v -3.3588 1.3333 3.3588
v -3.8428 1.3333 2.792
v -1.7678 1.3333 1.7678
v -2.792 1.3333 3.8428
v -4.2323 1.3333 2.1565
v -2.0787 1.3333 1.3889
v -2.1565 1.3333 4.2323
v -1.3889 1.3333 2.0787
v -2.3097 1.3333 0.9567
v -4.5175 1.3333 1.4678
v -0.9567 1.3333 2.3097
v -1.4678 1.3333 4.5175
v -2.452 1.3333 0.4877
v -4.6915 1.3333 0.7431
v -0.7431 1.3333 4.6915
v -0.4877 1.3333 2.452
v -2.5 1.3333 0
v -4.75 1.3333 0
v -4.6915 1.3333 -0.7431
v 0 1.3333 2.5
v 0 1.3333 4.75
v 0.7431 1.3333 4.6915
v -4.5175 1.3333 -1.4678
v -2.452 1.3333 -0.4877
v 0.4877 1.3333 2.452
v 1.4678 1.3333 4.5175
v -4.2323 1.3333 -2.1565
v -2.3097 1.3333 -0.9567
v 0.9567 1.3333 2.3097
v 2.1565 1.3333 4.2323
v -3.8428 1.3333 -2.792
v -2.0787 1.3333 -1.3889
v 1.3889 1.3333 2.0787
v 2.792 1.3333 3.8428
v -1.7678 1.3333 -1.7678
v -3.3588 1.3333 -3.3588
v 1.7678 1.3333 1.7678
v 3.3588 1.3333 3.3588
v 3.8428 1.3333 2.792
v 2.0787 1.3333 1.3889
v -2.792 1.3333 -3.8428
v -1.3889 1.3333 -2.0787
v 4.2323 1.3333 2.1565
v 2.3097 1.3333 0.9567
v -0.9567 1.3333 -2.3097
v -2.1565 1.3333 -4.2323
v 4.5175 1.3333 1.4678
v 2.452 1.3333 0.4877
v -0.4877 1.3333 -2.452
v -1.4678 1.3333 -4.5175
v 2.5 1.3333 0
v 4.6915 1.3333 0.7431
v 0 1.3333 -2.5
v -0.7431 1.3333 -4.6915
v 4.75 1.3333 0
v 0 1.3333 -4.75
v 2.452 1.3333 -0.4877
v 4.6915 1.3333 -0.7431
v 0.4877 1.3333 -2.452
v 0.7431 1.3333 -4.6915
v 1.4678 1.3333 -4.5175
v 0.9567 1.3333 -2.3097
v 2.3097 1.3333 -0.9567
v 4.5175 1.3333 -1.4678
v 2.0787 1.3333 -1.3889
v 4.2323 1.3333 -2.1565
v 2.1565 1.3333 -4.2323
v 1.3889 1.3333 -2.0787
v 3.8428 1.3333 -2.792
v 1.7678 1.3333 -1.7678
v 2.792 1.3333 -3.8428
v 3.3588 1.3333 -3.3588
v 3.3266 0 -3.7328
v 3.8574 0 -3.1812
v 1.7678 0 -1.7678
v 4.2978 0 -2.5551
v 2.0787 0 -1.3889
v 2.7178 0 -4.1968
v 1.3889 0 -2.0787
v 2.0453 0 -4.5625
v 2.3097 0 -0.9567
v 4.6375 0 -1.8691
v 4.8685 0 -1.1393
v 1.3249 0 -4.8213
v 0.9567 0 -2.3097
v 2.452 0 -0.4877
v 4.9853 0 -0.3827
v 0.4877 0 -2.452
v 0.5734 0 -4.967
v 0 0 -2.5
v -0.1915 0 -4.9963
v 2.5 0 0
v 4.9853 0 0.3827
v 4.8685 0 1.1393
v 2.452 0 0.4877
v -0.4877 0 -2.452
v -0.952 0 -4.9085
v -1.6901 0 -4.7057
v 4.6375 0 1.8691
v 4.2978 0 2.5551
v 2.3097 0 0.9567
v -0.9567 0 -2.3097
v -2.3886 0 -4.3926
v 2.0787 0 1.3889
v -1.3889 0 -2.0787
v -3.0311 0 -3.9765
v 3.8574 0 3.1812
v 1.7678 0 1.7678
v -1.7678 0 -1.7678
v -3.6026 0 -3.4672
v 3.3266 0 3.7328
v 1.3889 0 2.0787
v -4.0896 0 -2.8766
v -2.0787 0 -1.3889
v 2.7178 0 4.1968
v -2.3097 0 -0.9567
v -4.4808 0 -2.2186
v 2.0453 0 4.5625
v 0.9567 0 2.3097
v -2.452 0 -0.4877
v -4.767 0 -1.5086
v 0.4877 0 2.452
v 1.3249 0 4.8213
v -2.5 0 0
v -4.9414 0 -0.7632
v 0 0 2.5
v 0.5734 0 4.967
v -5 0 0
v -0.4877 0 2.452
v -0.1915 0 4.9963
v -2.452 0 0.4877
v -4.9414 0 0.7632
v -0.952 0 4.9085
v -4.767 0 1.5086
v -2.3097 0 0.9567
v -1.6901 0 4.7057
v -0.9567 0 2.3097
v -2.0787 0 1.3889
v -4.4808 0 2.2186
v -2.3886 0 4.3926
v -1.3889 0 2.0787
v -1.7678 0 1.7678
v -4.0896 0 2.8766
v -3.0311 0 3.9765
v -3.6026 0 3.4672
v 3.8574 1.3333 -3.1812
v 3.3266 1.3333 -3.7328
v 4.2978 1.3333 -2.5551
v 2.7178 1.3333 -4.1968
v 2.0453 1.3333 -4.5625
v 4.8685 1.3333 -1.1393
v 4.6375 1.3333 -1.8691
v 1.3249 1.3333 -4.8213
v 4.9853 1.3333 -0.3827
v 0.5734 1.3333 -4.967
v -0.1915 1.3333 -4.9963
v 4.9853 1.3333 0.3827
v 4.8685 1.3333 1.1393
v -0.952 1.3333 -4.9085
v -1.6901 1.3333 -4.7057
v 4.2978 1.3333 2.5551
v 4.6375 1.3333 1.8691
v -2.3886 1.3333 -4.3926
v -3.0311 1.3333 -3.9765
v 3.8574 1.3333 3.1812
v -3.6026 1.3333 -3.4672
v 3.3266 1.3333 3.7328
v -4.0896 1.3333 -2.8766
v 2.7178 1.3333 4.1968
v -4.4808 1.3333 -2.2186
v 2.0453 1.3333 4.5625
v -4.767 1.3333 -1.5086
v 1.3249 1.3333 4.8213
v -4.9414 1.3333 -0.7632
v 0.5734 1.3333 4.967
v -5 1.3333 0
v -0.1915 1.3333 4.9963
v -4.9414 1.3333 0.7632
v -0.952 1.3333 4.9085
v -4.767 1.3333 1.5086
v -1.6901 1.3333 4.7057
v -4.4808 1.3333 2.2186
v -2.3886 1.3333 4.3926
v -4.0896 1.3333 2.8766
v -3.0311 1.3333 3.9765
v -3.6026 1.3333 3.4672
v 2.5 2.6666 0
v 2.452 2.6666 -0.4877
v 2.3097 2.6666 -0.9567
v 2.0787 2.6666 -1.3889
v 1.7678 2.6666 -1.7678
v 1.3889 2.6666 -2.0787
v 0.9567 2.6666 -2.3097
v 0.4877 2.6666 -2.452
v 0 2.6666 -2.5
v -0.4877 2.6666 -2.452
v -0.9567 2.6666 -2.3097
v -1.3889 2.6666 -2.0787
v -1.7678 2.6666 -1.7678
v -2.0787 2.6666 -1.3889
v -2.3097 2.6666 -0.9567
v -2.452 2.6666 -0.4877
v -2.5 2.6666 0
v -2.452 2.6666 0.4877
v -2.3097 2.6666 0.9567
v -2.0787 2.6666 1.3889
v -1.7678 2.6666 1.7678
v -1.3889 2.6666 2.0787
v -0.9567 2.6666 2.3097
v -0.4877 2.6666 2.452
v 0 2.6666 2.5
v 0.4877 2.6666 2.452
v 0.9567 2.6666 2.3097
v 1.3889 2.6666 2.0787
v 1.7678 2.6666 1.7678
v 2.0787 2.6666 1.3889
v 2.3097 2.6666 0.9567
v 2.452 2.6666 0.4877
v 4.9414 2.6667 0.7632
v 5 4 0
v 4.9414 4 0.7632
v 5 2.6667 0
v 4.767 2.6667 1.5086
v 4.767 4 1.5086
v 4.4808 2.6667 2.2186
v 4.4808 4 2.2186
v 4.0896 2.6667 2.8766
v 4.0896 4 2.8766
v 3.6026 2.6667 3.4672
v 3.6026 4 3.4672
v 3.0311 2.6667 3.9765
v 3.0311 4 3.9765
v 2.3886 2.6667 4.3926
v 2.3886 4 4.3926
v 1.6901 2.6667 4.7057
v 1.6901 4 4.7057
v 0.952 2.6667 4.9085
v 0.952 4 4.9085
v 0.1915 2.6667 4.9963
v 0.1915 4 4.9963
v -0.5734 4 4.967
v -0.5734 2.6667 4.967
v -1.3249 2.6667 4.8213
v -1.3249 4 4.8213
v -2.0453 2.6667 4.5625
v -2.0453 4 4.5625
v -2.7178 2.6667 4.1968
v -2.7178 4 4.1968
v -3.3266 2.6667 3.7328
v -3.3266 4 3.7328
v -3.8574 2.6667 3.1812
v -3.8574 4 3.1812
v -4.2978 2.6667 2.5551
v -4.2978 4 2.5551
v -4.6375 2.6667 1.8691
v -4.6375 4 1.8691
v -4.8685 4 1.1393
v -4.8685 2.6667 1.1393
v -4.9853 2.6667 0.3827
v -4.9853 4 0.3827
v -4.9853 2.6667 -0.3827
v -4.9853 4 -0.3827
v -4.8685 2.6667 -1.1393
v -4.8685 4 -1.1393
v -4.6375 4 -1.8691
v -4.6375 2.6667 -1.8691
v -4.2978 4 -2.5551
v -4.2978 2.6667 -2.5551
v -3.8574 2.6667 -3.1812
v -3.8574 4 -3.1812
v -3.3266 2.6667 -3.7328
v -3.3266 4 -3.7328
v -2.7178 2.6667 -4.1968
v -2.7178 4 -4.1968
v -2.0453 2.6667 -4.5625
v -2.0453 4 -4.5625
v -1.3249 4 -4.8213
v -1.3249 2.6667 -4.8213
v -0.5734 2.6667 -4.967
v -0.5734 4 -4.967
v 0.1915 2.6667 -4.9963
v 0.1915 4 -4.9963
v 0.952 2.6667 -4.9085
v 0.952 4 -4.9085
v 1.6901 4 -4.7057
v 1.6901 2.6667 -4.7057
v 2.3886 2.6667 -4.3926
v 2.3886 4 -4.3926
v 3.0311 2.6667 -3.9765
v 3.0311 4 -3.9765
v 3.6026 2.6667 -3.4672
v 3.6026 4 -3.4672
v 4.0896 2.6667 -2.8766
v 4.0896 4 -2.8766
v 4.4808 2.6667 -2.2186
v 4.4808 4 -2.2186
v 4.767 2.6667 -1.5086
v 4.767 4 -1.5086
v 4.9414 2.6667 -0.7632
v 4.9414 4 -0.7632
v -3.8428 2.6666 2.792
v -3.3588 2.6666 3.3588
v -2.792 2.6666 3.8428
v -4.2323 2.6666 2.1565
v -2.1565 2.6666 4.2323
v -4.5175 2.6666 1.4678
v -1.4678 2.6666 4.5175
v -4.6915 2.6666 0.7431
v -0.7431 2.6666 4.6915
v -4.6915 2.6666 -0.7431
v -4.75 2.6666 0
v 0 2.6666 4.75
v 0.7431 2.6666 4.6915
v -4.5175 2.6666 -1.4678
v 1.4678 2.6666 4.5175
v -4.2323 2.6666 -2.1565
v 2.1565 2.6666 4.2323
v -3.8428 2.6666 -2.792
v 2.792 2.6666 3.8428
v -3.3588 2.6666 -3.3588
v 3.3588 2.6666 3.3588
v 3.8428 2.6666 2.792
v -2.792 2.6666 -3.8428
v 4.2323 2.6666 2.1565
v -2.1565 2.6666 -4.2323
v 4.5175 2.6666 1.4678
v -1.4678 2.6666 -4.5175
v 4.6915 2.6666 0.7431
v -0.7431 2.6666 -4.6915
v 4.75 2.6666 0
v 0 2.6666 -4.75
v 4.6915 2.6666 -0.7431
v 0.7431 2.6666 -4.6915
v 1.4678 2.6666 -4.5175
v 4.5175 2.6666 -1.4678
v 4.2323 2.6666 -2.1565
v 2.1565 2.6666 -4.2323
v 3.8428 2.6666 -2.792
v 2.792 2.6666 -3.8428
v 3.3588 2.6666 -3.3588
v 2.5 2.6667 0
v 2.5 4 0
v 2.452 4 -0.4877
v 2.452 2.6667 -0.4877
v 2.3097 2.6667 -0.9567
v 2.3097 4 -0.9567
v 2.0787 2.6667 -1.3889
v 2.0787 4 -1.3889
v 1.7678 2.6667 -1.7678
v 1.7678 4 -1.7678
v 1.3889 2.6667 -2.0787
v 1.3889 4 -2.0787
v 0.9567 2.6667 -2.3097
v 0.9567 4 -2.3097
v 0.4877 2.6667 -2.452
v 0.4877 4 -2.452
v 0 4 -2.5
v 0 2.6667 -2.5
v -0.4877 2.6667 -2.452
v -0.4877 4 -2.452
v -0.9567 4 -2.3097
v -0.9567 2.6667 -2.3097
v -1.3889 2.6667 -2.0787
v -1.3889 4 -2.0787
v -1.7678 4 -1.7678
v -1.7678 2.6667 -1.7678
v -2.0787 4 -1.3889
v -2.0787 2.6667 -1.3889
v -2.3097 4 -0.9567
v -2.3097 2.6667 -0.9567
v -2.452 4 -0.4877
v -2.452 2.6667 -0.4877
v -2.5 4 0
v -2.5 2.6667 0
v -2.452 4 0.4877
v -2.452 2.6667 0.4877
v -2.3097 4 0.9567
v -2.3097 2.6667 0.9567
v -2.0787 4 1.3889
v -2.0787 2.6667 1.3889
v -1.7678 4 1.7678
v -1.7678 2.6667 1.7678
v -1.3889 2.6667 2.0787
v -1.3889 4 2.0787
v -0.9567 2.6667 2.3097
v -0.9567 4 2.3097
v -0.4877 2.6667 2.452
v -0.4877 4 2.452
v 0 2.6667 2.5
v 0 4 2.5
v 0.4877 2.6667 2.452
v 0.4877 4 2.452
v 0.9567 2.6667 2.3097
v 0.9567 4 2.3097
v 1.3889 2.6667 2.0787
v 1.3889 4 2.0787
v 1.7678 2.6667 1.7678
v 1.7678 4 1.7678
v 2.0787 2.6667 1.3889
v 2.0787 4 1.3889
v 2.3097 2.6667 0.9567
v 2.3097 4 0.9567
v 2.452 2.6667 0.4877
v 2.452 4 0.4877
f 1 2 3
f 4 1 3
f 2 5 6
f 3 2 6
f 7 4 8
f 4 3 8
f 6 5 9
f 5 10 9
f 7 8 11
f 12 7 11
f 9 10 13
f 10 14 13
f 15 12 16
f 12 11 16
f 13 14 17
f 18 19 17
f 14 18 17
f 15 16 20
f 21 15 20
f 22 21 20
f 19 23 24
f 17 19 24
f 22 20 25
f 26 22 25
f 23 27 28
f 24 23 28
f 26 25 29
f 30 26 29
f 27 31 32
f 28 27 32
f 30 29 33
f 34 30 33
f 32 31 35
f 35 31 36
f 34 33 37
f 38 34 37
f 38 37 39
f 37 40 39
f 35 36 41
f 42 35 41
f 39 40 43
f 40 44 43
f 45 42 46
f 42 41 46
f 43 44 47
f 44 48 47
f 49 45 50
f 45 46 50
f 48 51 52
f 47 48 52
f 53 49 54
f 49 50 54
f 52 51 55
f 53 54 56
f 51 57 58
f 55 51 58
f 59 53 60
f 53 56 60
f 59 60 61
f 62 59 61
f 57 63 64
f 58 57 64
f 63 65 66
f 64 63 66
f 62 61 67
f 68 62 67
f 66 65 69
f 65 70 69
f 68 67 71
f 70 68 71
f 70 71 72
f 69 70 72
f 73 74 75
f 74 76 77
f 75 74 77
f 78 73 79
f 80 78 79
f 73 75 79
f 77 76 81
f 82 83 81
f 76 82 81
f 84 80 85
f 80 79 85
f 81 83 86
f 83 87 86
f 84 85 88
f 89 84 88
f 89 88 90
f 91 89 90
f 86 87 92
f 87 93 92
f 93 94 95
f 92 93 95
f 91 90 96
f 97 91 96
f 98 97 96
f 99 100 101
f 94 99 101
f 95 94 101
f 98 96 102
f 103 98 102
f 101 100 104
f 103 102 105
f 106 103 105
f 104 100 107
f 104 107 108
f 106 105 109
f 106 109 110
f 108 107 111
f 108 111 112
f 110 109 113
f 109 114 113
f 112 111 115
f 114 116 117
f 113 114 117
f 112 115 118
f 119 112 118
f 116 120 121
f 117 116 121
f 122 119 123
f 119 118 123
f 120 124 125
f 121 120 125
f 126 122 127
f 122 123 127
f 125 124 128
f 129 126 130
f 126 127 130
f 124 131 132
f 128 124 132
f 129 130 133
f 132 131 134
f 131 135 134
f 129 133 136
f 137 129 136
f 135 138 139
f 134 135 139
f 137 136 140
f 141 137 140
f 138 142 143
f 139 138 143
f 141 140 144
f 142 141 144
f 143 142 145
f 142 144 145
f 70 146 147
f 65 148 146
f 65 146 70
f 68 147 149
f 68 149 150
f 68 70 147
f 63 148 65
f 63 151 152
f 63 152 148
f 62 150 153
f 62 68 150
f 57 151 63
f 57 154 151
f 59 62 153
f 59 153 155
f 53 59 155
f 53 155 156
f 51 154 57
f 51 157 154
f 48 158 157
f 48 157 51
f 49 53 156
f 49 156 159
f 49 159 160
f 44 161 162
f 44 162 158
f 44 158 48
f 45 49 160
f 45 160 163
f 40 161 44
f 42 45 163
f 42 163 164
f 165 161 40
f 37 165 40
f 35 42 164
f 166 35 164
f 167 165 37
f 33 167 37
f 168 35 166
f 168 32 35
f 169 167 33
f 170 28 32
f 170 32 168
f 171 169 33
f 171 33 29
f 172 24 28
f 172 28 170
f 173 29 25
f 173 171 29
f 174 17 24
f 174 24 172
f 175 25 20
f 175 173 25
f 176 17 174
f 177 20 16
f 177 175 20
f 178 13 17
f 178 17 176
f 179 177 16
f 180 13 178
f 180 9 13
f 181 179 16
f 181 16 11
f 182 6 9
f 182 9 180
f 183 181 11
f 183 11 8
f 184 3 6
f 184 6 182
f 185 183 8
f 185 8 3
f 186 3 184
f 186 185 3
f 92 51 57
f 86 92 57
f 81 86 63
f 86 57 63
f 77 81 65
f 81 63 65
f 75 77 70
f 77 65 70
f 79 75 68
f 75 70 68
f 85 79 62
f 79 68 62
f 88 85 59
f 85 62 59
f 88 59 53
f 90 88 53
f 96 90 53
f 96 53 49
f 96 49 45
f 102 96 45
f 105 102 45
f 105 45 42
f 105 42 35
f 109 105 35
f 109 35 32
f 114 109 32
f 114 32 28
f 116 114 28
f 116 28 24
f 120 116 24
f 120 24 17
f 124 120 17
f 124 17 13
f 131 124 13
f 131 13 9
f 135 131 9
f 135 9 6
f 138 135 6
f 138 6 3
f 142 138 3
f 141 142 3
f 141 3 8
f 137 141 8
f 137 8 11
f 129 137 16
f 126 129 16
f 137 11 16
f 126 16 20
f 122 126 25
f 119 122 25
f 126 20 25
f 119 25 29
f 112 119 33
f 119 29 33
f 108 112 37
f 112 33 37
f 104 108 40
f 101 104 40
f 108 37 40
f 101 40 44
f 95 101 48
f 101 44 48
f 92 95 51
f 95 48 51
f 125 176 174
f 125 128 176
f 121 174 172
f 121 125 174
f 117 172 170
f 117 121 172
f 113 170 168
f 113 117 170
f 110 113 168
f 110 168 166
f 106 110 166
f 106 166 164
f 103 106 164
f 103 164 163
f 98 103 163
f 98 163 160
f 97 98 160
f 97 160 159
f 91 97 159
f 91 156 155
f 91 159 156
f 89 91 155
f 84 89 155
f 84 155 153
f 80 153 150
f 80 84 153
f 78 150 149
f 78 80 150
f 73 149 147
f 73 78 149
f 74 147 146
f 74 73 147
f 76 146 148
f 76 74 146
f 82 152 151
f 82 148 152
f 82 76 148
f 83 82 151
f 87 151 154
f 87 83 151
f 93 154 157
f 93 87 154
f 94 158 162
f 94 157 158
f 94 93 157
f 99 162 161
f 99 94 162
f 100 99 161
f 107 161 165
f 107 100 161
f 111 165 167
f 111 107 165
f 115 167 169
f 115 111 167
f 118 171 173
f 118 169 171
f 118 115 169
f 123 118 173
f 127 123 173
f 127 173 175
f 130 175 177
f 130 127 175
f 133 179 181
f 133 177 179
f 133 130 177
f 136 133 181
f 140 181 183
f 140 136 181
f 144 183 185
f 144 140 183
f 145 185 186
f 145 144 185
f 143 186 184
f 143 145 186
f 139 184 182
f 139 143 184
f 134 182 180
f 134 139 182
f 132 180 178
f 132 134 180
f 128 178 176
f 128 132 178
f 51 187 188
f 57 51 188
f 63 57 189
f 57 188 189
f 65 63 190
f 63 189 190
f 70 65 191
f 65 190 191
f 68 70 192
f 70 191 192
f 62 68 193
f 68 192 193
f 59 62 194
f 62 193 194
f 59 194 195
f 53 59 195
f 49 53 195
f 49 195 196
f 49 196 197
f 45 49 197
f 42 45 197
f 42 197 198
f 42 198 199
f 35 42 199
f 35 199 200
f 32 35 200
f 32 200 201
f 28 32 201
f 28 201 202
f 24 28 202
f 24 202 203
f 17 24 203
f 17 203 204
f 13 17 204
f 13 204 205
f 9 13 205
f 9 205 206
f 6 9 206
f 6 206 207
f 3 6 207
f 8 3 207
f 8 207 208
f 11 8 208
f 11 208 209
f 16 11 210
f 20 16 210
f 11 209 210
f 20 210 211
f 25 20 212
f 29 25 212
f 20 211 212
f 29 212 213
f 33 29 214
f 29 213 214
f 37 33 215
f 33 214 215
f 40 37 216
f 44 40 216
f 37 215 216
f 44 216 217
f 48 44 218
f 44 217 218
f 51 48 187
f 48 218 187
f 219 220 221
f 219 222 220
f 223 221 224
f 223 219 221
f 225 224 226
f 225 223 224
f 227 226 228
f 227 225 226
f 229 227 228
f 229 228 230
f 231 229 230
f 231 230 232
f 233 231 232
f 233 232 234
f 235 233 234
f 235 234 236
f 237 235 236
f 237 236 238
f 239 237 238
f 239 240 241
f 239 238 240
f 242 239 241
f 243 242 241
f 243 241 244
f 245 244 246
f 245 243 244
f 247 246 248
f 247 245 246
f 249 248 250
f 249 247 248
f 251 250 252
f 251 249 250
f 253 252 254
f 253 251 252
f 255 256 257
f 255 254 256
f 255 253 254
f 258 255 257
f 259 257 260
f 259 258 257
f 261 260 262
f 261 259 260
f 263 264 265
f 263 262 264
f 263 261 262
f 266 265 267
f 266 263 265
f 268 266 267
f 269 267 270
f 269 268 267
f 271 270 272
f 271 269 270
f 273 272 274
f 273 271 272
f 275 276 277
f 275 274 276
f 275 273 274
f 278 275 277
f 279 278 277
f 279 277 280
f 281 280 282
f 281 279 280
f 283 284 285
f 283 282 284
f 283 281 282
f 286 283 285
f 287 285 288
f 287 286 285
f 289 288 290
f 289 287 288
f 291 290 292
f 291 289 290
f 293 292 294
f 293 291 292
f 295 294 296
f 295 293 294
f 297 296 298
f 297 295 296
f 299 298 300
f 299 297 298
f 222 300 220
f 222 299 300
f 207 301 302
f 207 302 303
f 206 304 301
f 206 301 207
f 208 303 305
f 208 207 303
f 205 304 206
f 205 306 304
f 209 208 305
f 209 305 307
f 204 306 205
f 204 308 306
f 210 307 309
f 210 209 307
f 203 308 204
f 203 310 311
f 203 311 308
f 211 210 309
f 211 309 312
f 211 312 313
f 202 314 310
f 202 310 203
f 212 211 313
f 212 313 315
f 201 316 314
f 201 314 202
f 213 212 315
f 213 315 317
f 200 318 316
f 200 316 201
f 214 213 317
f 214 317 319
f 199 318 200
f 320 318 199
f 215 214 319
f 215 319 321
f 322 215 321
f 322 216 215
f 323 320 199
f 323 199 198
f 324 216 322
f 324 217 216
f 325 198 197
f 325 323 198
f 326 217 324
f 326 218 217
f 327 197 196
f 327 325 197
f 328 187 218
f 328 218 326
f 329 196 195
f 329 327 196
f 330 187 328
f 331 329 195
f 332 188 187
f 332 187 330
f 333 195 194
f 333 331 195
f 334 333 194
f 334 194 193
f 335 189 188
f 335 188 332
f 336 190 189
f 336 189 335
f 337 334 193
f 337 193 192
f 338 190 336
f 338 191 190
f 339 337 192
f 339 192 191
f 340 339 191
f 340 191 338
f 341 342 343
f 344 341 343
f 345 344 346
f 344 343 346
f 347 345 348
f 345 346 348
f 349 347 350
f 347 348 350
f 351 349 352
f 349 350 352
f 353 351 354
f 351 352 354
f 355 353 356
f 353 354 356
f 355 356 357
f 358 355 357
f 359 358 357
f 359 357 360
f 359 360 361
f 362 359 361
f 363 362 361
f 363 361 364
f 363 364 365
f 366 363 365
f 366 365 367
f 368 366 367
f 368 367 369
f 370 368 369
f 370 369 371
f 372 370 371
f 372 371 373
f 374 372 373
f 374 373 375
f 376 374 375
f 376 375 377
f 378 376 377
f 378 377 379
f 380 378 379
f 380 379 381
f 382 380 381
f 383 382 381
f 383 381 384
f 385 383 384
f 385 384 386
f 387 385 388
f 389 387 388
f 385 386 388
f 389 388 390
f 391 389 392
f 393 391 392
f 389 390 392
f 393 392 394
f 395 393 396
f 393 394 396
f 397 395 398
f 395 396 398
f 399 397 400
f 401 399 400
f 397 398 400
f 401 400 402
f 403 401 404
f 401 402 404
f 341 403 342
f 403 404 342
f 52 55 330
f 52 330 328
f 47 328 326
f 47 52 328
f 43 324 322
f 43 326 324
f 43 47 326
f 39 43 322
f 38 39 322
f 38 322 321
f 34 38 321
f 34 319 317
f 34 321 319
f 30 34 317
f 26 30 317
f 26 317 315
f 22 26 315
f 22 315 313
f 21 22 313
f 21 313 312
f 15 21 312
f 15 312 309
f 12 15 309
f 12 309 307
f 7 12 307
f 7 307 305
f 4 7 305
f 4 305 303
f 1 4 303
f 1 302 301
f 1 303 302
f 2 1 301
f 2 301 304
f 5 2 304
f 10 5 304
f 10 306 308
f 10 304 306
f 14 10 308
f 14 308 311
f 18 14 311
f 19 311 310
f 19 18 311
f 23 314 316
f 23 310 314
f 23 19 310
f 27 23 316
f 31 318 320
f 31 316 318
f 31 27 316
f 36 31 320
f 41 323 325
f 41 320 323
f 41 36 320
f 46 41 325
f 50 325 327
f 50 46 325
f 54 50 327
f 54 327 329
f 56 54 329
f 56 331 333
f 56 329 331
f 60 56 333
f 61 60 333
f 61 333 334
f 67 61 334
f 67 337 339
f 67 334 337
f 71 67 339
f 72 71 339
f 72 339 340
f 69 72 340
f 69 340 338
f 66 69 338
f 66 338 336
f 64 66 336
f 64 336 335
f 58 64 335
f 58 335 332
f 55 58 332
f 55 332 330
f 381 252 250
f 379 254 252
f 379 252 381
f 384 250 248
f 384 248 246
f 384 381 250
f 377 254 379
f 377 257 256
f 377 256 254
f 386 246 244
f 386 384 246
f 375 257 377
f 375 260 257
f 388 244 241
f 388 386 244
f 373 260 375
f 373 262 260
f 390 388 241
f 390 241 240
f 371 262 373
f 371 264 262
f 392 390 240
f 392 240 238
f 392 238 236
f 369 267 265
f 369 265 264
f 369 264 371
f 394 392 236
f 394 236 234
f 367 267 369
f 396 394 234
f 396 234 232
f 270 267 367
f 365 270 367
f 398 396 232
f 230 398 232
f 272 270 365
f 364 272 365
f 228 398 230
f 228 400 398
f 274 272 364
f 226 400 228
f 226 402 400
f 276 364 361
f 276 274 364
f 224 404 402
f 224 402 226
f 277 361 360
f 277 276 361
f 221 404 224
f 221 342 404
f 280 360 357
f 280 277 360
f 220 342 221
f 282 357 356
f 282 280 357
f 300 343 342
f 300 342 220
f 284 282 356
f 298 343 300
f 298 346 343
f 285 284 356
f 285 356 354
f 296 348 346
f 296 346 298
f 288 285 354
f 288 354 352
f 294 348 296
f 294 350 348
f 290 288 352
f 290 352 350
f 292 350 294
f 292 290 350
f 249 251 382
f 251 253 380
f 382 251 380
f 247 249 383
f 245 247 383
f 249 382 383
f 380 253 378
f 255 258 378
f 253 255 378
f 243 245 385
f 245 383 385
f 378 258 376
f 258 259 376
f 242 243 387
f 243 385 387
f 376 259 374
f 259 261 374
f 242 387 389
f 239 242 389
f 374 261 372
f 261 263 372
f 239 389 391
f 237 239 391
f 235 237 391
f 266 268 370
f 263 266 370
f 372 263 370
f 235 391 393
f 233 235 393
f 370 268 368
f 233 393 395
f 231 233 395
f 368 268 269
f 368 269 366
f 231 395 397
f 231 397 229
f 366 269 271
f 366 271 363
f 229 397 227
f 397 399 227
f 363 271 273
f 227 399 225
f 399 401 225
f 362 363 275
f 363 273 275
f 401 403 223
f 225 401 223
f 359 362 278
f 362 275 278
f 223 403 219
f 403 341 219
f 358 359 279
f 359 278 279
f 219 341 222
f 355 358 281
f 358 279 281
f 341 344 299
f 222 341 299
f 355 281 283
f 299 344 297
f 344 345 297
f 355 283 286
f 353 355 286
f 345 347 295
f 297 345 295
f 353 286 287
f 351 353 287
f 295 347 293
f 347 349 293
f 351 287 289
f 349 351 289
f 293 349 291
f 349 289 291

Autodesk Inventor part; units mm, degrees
ref_plane "YZ Plane" through (0, 0, 0) normal (1, 0, 0) x (0, 1, 0)
ref_plane "XZ Plane" through (0, 0, 0) normal (0, 1, 0) x (-1, 0, 0)
ref_plane "XY Plane" through (0, 0, 0) normal (0, 0, 1) x (1, 0, 0)
sketch "Sketch1" plane through (0, 0, 0) normal (0, 1, 0) x (-1, 0, 0)
  circle A0 centre (0, 0) radius 5
  dimension "d0" = 10
extrude "Extrusion1" add sketch "Sketch1" along normal blind 1.3333
sketch "Sketch2" plane through (0, 1.3333, 0) normal (0, 1, 0) x (1, 0, 0)
  circle A0 centre (0, 0) radius 4.75
  dimension "d3" = 9.5
extrude "Extrusion2" add sketch "Sketch2" along normal blind 1.3333 separate body
sketch "Sketch3" plane through (0, 2.6667, 0) normal (0, 1, 0) x (1, 0, 0)
  circle A0 centre (0, 0) radius 5
extrude "Extrusion3" add sketch "Sketch3" along normal blind 1.3333 separate body
sketch "Sketch4" plane through (0, 4, 0) normal (0, 1, 0) x (1, 0, 0)
  circle A0 centre (0, 0) radius 2.5
  dimension "d8" = 5
extrude "Extrusion4" cut sketch "Sketch4" against normal blind 10 bodies 3 2 1
properties part number "Rotation Bearing"
